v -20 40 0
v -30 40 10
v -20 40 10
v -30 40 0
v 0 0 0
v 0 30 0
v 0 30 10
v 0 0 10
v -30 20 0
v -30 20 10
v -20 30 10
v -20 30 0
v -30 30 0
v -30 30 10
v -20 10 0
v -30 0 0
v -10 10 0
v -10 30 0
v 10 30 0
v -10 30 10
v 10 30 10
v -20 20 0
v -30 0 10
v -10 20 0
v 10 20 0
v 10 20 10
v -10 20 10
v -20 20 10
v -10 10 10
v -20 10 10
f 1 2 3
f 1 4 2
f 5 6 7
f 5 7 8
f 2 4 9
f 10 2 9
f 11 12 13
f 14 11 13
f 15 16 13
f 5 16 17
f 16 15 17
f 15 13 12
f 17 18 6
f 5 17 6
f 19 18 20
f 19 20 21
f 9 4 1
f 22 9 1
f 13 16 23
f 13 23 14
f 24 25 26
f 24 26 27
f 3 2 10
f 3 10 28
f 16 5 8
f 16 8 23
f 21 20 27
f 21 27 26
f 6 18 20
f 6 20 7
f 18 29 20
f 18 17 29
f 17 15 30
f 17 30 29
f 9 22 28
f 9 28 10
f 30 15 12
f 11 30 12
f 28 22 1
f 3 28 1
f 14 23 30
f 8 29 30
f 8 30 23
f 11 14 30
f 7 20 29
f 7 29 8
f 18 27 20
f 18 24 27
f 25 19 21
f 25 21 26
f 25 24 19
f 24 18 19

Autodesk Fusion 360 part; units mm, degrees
sketch "Sketch1" plane through (0, 0, 0) normal (0, 0, 1) x (1, 0, 0)
  line L0 (0, 0) -> (-30, 0)
  line L1 (-30, 0) -> (-30, 10)
  line L2 (-30, 10) -> (0, 10)
  line L3 (0, 10) -> (0, 0)
  line L4 (-30, 10) -> (-20, 10)
  line L5 (-20, 10) -> (-20, 30)
  line L6 (-20, 30) -> (-30, 30)
  line L7 (-30, 30) -> (-30, 10)
  line L8 (0, 10) -> (-10, 10)
  line L9 (-10, 10) -> (-10, 30)
  line L10 (-10, 30) -> (0, 30)
  line L11 (0, 30) -> (0, 10)
  line L12 (-30, 30) -> (0, 30)
  line L13 (0, 30) -> (0, 20)
  line L14 (0, 20) -> (-30, 20)
  line L15 (-30, 20) -> (-30, 30)
  line L16 (-20, 30) -> (-30, 30)
  line L17 (-30, 30) -> (-30, 40)
  line L18 (-30, 40) -> (-20, 40)
  line L19 (-20, 40) -> (-20, 30)
  line L20 (0, 30) -> (10, 30)
  line L21 (10, 30) -> (10, 20)
  line L22 (10, 20) -> (0, 20)
  line L23 (0, 20) -> (0, 30)
extrude "Extrude1" add sketch "Sketch1" along normal blind 10 contours L0 L1 L2 L3 L4 L8 | L2 L8 L9 L11 L14 | L2 L4 L5 L7 L14 | L9 L10 L11 L12 L13 L14 L23 | L5 L6 L7 L12 L14 L15 L16 makes body 1
extrude "Extrude2" add sketch "Sketch1" along normal blind 10 separate body contours L9 L10 L11 L12 L13 L14 L23 | L11 L13 L20 L21 L22 L23 | L5 L6 L7 L12 L14 L15 L16 | L6 L12 L16 L17 L18 L19 makes body 2 at (-3.3333, 23.3333, 0) makes body 3 at (-26.6667, 26.6667, 0) in component "Tool"
component "Tool" placed x (1, 0, 0) y (0, 1, 0) z (0, 0, 1) at (0, 0, 0)
